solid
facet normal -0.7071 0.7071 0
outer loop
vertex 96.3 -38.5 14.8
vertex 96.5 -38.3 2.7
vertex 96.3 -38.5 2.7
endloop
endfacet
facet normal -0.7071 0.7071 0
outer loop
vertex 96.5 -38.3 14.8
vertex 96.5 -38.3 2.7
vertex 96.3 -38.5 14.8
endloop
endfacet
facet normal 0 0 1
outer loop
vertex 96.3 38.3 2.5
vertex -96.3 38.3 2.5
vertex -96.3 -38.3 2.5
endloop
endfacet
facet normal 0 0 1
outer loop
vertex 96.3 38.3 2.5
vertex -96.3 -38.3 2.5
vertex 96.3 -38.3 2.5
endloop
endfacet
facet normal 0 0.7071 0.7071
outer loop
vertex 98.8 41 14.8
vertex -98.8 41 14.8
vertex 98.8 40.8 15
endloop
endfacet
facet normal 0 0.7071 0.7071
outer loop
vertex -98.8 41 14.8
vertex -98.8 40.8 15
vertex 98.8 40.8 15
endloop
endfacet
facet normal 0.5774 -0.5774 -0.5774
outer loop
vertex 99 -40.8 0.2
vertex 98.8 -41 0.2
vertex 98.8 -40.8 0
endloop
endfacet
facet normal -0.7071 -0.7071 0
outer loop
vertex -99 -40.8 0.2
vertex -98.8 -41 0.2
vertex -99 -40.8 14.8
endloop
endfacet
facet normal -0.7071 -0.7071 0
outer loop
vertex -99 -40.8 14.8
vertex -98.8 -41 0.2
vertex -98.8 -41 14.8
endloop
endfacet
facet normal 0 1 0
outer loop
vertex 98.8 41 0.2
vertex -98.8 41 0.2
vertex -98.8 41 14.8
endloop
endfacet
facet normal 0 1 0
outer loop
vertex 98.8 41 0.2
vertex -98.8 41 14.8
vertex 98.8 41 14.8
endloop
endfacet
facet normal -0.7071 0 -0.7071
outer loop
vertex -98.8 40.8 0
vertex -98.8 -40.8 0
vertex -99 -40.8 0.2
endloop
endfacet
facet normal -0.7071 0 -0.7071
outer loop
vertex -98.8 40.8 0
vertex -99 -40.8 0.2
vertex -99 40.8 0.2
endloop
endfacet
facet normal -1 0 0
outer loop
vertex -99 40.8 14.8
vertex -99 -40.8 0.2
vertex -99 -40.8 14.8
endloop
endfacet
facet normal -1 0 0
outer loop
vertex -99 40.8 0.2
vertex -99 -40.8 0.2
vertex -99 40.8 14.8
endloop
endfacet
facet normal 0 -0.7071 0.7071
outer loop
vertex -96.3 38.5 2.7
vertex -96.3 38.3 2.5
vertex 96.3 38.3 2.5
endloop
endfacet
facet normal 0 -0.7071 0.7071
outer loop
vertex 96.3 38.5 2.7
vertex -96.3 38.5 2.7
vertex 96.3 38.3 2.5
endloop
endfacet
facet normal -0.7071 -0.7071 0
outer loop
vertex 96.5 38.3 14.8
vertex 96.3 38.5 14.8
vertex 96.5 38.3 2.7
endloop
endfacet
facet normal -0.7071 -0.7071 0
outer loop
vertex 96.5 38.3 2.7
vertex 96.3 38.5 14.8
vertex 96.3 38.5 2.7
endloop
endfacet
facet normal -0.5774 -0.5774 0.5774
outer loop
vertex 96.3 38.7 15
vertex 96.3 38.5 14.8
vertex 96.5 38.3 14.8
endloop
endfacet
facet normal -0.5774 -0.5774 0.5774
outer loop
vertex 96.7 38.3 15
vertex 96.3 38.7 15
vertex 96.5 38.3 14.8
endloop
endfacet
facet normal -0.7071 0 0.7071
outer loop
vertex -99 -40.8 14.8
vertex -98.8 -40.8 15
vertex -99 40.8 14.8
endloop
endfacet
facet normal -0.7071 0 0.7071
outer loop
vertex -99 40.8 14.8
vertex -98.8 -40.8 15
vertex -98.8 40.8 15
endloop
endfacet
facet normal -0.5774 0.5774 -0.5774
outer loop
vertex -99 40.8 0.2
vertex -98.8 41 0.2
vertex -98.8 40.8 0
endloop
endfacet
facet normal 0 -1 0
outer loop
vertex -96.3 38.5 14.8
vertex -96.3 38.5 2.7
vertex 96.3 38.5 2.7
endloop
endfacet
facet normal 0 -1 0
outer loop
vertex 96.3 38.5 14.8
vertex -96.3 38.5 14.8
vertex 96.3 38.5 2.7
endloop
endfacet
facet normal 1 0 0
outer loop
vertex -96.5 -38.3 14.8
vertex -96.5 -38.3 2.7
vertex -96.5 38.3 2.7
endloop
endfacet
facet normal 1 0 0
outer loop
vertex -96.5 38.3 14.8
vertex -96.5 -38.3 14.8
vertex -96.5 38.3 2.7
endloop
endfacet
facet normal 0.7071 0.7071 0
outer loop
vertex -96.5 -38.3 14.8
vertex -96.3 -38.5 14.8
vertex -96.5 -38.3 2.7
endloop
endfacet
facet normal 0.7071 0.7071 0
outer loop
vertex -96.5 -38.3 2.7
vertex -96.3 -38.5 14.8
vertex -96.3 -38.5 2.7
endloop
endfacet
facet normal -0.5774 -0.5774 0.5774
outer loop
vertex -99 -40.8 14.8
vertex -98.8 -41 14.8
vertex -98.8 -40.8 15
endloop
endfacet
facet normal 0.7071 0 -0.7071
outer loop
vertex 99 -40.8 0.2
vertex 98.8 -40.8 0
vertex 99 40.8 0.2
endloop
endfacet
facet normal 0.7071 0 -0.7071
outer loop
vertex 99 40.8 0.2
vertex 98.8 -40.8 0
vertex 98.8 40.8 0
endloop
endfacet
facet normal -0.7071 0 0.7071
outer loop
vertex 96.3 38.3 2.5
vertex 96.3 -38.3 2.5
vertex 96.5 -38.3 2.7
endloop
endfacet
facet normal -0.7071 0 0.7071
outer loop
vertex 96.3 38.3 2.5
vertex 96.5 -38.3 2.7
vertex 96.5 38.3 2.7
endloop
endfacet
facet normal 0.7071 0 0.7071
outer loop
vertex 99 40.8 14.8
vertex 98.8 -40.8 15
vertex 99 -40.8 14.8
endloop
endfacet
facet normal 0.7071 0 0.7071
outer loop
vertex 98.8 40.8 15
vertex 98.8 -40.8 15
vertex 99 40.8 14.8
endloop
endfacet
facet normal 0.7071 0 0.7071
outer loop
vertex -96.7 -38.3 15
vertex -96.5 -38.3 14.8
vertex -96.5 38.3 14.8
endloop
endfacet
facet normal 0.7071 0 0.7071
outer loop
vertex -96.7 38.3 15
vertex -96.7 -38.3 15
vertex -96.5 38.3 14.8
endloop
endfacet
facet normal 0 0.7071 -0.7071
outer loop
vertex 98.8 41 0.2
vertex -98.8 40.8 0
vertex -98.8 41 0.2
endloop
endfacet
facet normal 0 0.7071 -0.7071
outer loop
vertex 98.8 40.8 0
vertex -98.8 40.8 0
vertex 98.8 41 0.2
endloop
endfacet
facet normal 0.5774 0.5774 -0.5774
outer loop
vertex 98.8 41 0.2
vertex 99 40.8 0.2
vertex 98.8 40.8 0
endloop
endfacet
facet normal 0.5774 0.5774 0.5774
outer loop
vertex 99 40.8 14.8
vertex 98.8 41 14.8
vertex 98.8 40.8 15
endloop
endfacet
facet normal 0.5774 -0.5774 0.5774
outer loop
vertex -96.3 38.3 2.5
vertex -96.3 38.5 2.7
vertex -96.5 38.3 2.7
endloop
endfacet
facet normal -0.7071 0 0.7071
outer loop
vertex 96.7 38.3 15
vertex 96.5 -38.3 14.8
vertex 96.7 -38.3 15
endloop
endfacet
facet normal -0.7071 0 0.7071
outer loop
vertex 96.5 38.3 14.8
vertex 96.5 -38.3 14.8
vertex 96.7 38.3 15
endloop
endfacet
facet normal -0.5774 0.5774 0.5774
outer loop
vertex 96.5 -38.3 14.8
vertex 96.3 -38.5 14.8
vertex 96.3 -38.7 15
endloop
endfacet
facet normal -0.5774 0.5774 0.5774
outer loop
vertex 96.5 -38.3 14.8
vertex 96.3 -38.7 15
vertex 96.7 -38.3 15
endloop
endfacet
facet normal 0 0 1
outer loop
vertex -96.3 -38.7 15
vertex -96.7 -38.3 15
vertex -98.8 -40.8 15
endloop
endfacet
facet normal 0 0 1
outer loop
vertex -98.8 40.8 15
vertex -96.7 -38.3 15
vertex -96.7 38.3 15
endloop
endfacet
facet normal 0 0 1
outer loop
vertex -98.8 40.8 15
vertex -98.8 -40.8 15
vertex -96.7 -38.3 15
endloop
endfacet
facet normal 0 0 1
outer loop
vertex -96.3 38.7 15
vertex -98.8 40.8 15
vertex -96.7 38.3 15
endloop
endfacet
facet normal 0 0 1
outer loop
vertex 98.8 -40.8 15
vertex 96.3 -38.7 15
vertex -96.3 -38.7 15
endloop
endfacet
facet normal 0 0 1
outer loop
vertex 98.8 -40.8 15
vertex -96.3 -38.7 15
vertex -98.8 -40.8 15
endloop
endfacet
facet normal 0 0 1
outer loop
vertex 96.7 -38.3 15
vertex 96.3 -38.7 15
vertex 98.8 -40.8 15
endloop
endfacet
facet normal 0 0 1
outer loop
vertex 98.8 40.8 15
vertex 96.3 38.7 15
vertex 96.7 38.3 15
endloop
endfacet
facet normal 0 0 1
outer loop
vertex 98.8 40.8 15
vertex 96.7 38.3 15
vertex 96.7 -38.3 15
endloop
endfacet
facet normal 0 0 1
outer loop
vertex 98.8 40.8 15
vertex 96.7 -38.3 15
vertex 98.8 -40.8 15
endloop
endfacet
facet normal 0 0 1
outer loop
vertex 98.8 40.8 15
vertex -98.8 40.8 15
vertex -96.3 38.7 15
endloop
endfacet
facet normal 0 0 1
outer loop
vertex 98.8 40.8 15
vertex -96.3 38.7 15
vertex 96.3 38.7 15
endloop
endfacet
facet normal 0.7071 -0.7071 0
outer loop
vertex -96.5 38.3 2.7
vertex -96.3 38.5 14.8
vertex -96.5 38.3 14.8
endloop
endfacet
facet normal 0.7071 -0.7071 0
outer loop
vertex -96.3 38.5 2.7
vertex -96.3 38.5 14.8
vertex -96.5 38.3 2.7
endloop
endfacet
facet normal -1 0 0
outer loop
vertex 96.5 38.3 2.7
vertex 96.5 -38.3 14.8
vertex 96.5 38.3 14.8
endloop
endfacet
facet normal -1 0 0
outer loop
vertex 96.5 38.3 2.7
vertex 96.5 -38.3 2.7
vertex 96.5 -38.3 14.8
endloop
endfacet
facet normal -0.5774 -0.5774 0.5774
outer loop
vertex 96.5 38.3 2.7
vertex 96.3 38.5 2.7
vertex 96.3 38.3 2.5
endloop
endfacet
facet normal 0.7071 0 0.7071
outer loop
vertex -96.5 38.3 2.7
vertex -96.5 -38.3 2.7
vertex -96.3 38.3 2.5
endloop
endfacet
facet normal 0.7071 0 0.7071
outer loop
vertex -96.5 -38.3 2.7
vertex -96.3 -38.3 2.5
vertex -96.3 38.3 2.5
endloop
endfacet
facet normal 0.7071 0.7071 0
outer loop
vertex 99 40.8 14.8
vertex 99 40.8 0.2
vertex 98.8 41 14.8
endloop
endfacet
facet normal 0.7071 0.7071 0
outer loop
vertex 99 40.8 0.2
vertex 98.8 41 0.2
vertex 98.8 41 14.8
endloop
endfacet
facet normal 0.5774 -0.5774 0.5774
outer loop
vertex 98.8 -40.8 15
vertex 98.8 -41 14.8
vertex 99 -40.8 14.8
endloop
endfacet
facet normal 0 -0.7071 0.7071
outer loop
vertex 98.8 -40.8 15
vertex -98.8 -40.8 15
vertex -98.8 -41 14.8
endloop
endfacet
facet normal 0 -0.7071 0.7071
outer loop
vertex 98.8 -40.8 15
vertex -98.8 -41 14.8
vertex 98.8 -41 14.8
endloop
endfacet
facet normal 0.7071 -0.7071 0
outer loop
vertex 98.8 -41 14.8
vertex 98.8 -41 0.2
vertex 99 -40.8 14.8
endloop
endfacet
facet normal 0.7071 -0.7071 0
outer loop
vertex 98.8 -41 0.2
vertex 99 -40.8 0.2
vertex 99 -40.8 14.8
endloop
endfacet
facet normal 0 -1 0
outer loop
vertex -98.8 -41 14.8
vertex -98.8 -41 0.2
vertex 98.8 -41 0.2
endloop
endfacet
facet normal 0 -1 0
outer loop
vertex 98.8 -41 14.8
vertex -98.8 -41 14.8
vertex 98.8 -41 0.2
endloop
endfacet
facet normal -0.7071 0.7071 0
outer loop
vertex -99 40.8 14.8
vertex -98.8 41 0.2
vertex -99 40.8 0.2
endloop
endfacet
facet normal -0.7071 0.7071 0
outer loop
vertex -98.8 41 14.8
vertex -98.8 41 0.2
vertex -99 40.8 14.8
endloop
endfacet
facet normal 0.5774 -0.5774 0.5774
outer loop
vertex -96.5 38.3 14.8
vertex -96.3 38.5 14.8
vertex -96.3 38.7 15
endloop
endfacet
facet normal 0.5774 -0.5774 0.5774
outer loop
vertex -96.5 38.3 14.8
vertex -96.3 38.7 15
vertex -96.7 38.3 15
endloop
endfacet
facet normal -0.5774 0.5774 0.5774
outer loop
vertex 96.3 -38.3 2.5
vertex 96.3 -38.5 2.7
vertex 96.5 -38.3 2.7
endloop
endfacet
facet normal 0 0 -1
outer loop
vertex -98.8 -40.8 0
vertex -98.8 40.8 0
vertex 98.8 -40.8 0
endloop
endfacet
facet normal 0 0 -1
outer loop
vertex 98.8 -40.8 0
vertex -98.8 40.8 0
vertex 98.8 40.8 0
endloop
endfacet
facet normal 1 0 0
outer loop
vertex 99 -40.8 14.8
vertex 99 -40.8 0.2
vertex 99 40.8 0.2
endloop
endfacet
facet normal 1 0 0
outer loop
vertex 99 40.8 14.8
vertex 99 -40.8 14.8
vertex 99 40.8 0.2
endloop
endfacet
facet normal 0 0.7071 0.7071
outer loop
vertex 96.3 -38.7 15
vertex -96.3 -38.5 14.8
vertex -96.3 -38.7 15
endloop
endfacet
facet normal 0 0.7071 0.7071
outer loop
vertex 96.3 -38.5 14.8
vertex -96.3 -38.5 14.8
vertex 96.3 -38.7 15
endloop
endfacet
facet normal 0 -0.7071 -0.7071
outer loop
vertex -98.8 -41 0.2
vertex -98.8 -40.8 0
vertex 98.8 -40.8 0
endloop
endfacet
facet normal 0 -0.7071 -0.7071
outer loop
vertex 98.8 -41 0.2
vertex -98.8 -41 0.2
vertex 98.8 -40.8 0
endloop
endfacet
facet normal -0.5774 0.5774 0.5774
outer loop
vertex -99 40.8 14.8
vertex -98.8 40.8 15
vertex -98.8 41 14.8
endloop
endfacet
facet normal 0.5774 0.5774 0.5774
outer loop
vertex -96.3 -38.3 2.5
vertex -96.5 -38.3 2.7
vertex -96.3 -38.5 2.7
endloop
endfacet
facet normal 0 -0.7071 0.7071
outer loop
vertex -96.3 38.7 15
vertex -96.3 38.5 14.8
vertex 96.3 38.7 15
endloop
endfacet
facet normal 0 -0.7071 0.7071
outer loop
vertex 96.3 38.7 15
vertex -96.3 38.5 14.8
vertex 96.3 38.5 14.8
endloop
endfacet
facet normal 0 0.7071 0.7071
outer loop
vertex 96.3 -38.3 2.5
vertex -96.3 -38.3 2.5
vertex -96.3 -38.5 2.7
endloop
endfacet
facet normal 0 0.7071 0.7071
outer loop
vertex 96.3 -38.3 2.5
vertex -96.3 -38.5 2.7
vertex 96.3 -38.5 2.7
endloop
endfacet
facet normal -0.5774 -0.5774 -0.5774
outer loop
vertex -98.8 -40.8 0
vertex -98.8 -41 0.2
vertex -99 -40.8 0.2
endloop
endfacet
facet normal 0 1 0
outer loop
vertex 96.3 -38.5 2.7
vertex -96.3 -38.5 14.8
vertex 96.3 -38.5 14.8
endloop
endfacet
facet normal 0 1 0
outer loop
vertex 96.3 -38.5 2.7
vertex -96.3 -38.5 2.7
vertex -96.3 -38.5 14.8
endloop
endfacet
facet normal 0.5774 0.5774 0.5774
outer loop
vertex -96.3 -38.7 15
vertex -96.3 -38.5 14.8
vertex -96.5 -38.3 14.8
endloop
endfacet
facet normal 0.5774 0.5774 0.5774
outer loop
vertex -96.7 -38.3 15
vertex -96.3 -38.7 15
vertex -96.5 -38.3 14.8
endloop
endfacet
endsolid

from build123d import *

# Parameters (mm, degrees)
F0_W     = 198
F0_H     = 82
F1_DEPTH = 15
F2_T     = -2.5
F3_SIZE  = 0.2


with BuildPart() as f1:
    # F0 (on Top) → F1 (new body)
    with BuildSketch(Plane.XY):
        Rectangle(F0_W, F0_H)
    extrude(amount=F1_DEPTH)

    # F2
    f2_openings = [f1.faces().sort_by_distance(p)[0] for p in [
        (0, 0, 15),
    ]]
    offset(amount=F2_T, openings=f2_openings)

    # F3
    f3_edges = [f1.edges().sort_by_distance(p)[0] for p in [
        (99, 41, 7.5),
        (99, -41, 7.5),
        (-99, -41, 7.5),
        (0, -41, 0),
        (0, -41, 15),
        (0, 41, 15),
        (-99, 0, 15),
        (99, 0, 0),
        (99, 0, 15),
        (-96.5, 38.5, 8.75),
        (0, -38.5, 15),
        (0, 38.5, 2.5),
        (0, 38.5, 15),
        (-96.5, 0, 2.5),
        (-96.5, 0, 15),
        (96.5, 0, 15),
        (-99, 41, 7.5),
        (0, 41, 0),
        (-99, 0, 0),
        (-96.5, -38.5, 8.75),
        (96.5, -38.5, 8.75),
        (96.5, 38.5, 8.75),
        (0, -38.5, 2.5),
        (96.5, 0, 2.5),
    ]]
    chamfer(f3_edges, length=F3_SIZE)


solid = f1.part
